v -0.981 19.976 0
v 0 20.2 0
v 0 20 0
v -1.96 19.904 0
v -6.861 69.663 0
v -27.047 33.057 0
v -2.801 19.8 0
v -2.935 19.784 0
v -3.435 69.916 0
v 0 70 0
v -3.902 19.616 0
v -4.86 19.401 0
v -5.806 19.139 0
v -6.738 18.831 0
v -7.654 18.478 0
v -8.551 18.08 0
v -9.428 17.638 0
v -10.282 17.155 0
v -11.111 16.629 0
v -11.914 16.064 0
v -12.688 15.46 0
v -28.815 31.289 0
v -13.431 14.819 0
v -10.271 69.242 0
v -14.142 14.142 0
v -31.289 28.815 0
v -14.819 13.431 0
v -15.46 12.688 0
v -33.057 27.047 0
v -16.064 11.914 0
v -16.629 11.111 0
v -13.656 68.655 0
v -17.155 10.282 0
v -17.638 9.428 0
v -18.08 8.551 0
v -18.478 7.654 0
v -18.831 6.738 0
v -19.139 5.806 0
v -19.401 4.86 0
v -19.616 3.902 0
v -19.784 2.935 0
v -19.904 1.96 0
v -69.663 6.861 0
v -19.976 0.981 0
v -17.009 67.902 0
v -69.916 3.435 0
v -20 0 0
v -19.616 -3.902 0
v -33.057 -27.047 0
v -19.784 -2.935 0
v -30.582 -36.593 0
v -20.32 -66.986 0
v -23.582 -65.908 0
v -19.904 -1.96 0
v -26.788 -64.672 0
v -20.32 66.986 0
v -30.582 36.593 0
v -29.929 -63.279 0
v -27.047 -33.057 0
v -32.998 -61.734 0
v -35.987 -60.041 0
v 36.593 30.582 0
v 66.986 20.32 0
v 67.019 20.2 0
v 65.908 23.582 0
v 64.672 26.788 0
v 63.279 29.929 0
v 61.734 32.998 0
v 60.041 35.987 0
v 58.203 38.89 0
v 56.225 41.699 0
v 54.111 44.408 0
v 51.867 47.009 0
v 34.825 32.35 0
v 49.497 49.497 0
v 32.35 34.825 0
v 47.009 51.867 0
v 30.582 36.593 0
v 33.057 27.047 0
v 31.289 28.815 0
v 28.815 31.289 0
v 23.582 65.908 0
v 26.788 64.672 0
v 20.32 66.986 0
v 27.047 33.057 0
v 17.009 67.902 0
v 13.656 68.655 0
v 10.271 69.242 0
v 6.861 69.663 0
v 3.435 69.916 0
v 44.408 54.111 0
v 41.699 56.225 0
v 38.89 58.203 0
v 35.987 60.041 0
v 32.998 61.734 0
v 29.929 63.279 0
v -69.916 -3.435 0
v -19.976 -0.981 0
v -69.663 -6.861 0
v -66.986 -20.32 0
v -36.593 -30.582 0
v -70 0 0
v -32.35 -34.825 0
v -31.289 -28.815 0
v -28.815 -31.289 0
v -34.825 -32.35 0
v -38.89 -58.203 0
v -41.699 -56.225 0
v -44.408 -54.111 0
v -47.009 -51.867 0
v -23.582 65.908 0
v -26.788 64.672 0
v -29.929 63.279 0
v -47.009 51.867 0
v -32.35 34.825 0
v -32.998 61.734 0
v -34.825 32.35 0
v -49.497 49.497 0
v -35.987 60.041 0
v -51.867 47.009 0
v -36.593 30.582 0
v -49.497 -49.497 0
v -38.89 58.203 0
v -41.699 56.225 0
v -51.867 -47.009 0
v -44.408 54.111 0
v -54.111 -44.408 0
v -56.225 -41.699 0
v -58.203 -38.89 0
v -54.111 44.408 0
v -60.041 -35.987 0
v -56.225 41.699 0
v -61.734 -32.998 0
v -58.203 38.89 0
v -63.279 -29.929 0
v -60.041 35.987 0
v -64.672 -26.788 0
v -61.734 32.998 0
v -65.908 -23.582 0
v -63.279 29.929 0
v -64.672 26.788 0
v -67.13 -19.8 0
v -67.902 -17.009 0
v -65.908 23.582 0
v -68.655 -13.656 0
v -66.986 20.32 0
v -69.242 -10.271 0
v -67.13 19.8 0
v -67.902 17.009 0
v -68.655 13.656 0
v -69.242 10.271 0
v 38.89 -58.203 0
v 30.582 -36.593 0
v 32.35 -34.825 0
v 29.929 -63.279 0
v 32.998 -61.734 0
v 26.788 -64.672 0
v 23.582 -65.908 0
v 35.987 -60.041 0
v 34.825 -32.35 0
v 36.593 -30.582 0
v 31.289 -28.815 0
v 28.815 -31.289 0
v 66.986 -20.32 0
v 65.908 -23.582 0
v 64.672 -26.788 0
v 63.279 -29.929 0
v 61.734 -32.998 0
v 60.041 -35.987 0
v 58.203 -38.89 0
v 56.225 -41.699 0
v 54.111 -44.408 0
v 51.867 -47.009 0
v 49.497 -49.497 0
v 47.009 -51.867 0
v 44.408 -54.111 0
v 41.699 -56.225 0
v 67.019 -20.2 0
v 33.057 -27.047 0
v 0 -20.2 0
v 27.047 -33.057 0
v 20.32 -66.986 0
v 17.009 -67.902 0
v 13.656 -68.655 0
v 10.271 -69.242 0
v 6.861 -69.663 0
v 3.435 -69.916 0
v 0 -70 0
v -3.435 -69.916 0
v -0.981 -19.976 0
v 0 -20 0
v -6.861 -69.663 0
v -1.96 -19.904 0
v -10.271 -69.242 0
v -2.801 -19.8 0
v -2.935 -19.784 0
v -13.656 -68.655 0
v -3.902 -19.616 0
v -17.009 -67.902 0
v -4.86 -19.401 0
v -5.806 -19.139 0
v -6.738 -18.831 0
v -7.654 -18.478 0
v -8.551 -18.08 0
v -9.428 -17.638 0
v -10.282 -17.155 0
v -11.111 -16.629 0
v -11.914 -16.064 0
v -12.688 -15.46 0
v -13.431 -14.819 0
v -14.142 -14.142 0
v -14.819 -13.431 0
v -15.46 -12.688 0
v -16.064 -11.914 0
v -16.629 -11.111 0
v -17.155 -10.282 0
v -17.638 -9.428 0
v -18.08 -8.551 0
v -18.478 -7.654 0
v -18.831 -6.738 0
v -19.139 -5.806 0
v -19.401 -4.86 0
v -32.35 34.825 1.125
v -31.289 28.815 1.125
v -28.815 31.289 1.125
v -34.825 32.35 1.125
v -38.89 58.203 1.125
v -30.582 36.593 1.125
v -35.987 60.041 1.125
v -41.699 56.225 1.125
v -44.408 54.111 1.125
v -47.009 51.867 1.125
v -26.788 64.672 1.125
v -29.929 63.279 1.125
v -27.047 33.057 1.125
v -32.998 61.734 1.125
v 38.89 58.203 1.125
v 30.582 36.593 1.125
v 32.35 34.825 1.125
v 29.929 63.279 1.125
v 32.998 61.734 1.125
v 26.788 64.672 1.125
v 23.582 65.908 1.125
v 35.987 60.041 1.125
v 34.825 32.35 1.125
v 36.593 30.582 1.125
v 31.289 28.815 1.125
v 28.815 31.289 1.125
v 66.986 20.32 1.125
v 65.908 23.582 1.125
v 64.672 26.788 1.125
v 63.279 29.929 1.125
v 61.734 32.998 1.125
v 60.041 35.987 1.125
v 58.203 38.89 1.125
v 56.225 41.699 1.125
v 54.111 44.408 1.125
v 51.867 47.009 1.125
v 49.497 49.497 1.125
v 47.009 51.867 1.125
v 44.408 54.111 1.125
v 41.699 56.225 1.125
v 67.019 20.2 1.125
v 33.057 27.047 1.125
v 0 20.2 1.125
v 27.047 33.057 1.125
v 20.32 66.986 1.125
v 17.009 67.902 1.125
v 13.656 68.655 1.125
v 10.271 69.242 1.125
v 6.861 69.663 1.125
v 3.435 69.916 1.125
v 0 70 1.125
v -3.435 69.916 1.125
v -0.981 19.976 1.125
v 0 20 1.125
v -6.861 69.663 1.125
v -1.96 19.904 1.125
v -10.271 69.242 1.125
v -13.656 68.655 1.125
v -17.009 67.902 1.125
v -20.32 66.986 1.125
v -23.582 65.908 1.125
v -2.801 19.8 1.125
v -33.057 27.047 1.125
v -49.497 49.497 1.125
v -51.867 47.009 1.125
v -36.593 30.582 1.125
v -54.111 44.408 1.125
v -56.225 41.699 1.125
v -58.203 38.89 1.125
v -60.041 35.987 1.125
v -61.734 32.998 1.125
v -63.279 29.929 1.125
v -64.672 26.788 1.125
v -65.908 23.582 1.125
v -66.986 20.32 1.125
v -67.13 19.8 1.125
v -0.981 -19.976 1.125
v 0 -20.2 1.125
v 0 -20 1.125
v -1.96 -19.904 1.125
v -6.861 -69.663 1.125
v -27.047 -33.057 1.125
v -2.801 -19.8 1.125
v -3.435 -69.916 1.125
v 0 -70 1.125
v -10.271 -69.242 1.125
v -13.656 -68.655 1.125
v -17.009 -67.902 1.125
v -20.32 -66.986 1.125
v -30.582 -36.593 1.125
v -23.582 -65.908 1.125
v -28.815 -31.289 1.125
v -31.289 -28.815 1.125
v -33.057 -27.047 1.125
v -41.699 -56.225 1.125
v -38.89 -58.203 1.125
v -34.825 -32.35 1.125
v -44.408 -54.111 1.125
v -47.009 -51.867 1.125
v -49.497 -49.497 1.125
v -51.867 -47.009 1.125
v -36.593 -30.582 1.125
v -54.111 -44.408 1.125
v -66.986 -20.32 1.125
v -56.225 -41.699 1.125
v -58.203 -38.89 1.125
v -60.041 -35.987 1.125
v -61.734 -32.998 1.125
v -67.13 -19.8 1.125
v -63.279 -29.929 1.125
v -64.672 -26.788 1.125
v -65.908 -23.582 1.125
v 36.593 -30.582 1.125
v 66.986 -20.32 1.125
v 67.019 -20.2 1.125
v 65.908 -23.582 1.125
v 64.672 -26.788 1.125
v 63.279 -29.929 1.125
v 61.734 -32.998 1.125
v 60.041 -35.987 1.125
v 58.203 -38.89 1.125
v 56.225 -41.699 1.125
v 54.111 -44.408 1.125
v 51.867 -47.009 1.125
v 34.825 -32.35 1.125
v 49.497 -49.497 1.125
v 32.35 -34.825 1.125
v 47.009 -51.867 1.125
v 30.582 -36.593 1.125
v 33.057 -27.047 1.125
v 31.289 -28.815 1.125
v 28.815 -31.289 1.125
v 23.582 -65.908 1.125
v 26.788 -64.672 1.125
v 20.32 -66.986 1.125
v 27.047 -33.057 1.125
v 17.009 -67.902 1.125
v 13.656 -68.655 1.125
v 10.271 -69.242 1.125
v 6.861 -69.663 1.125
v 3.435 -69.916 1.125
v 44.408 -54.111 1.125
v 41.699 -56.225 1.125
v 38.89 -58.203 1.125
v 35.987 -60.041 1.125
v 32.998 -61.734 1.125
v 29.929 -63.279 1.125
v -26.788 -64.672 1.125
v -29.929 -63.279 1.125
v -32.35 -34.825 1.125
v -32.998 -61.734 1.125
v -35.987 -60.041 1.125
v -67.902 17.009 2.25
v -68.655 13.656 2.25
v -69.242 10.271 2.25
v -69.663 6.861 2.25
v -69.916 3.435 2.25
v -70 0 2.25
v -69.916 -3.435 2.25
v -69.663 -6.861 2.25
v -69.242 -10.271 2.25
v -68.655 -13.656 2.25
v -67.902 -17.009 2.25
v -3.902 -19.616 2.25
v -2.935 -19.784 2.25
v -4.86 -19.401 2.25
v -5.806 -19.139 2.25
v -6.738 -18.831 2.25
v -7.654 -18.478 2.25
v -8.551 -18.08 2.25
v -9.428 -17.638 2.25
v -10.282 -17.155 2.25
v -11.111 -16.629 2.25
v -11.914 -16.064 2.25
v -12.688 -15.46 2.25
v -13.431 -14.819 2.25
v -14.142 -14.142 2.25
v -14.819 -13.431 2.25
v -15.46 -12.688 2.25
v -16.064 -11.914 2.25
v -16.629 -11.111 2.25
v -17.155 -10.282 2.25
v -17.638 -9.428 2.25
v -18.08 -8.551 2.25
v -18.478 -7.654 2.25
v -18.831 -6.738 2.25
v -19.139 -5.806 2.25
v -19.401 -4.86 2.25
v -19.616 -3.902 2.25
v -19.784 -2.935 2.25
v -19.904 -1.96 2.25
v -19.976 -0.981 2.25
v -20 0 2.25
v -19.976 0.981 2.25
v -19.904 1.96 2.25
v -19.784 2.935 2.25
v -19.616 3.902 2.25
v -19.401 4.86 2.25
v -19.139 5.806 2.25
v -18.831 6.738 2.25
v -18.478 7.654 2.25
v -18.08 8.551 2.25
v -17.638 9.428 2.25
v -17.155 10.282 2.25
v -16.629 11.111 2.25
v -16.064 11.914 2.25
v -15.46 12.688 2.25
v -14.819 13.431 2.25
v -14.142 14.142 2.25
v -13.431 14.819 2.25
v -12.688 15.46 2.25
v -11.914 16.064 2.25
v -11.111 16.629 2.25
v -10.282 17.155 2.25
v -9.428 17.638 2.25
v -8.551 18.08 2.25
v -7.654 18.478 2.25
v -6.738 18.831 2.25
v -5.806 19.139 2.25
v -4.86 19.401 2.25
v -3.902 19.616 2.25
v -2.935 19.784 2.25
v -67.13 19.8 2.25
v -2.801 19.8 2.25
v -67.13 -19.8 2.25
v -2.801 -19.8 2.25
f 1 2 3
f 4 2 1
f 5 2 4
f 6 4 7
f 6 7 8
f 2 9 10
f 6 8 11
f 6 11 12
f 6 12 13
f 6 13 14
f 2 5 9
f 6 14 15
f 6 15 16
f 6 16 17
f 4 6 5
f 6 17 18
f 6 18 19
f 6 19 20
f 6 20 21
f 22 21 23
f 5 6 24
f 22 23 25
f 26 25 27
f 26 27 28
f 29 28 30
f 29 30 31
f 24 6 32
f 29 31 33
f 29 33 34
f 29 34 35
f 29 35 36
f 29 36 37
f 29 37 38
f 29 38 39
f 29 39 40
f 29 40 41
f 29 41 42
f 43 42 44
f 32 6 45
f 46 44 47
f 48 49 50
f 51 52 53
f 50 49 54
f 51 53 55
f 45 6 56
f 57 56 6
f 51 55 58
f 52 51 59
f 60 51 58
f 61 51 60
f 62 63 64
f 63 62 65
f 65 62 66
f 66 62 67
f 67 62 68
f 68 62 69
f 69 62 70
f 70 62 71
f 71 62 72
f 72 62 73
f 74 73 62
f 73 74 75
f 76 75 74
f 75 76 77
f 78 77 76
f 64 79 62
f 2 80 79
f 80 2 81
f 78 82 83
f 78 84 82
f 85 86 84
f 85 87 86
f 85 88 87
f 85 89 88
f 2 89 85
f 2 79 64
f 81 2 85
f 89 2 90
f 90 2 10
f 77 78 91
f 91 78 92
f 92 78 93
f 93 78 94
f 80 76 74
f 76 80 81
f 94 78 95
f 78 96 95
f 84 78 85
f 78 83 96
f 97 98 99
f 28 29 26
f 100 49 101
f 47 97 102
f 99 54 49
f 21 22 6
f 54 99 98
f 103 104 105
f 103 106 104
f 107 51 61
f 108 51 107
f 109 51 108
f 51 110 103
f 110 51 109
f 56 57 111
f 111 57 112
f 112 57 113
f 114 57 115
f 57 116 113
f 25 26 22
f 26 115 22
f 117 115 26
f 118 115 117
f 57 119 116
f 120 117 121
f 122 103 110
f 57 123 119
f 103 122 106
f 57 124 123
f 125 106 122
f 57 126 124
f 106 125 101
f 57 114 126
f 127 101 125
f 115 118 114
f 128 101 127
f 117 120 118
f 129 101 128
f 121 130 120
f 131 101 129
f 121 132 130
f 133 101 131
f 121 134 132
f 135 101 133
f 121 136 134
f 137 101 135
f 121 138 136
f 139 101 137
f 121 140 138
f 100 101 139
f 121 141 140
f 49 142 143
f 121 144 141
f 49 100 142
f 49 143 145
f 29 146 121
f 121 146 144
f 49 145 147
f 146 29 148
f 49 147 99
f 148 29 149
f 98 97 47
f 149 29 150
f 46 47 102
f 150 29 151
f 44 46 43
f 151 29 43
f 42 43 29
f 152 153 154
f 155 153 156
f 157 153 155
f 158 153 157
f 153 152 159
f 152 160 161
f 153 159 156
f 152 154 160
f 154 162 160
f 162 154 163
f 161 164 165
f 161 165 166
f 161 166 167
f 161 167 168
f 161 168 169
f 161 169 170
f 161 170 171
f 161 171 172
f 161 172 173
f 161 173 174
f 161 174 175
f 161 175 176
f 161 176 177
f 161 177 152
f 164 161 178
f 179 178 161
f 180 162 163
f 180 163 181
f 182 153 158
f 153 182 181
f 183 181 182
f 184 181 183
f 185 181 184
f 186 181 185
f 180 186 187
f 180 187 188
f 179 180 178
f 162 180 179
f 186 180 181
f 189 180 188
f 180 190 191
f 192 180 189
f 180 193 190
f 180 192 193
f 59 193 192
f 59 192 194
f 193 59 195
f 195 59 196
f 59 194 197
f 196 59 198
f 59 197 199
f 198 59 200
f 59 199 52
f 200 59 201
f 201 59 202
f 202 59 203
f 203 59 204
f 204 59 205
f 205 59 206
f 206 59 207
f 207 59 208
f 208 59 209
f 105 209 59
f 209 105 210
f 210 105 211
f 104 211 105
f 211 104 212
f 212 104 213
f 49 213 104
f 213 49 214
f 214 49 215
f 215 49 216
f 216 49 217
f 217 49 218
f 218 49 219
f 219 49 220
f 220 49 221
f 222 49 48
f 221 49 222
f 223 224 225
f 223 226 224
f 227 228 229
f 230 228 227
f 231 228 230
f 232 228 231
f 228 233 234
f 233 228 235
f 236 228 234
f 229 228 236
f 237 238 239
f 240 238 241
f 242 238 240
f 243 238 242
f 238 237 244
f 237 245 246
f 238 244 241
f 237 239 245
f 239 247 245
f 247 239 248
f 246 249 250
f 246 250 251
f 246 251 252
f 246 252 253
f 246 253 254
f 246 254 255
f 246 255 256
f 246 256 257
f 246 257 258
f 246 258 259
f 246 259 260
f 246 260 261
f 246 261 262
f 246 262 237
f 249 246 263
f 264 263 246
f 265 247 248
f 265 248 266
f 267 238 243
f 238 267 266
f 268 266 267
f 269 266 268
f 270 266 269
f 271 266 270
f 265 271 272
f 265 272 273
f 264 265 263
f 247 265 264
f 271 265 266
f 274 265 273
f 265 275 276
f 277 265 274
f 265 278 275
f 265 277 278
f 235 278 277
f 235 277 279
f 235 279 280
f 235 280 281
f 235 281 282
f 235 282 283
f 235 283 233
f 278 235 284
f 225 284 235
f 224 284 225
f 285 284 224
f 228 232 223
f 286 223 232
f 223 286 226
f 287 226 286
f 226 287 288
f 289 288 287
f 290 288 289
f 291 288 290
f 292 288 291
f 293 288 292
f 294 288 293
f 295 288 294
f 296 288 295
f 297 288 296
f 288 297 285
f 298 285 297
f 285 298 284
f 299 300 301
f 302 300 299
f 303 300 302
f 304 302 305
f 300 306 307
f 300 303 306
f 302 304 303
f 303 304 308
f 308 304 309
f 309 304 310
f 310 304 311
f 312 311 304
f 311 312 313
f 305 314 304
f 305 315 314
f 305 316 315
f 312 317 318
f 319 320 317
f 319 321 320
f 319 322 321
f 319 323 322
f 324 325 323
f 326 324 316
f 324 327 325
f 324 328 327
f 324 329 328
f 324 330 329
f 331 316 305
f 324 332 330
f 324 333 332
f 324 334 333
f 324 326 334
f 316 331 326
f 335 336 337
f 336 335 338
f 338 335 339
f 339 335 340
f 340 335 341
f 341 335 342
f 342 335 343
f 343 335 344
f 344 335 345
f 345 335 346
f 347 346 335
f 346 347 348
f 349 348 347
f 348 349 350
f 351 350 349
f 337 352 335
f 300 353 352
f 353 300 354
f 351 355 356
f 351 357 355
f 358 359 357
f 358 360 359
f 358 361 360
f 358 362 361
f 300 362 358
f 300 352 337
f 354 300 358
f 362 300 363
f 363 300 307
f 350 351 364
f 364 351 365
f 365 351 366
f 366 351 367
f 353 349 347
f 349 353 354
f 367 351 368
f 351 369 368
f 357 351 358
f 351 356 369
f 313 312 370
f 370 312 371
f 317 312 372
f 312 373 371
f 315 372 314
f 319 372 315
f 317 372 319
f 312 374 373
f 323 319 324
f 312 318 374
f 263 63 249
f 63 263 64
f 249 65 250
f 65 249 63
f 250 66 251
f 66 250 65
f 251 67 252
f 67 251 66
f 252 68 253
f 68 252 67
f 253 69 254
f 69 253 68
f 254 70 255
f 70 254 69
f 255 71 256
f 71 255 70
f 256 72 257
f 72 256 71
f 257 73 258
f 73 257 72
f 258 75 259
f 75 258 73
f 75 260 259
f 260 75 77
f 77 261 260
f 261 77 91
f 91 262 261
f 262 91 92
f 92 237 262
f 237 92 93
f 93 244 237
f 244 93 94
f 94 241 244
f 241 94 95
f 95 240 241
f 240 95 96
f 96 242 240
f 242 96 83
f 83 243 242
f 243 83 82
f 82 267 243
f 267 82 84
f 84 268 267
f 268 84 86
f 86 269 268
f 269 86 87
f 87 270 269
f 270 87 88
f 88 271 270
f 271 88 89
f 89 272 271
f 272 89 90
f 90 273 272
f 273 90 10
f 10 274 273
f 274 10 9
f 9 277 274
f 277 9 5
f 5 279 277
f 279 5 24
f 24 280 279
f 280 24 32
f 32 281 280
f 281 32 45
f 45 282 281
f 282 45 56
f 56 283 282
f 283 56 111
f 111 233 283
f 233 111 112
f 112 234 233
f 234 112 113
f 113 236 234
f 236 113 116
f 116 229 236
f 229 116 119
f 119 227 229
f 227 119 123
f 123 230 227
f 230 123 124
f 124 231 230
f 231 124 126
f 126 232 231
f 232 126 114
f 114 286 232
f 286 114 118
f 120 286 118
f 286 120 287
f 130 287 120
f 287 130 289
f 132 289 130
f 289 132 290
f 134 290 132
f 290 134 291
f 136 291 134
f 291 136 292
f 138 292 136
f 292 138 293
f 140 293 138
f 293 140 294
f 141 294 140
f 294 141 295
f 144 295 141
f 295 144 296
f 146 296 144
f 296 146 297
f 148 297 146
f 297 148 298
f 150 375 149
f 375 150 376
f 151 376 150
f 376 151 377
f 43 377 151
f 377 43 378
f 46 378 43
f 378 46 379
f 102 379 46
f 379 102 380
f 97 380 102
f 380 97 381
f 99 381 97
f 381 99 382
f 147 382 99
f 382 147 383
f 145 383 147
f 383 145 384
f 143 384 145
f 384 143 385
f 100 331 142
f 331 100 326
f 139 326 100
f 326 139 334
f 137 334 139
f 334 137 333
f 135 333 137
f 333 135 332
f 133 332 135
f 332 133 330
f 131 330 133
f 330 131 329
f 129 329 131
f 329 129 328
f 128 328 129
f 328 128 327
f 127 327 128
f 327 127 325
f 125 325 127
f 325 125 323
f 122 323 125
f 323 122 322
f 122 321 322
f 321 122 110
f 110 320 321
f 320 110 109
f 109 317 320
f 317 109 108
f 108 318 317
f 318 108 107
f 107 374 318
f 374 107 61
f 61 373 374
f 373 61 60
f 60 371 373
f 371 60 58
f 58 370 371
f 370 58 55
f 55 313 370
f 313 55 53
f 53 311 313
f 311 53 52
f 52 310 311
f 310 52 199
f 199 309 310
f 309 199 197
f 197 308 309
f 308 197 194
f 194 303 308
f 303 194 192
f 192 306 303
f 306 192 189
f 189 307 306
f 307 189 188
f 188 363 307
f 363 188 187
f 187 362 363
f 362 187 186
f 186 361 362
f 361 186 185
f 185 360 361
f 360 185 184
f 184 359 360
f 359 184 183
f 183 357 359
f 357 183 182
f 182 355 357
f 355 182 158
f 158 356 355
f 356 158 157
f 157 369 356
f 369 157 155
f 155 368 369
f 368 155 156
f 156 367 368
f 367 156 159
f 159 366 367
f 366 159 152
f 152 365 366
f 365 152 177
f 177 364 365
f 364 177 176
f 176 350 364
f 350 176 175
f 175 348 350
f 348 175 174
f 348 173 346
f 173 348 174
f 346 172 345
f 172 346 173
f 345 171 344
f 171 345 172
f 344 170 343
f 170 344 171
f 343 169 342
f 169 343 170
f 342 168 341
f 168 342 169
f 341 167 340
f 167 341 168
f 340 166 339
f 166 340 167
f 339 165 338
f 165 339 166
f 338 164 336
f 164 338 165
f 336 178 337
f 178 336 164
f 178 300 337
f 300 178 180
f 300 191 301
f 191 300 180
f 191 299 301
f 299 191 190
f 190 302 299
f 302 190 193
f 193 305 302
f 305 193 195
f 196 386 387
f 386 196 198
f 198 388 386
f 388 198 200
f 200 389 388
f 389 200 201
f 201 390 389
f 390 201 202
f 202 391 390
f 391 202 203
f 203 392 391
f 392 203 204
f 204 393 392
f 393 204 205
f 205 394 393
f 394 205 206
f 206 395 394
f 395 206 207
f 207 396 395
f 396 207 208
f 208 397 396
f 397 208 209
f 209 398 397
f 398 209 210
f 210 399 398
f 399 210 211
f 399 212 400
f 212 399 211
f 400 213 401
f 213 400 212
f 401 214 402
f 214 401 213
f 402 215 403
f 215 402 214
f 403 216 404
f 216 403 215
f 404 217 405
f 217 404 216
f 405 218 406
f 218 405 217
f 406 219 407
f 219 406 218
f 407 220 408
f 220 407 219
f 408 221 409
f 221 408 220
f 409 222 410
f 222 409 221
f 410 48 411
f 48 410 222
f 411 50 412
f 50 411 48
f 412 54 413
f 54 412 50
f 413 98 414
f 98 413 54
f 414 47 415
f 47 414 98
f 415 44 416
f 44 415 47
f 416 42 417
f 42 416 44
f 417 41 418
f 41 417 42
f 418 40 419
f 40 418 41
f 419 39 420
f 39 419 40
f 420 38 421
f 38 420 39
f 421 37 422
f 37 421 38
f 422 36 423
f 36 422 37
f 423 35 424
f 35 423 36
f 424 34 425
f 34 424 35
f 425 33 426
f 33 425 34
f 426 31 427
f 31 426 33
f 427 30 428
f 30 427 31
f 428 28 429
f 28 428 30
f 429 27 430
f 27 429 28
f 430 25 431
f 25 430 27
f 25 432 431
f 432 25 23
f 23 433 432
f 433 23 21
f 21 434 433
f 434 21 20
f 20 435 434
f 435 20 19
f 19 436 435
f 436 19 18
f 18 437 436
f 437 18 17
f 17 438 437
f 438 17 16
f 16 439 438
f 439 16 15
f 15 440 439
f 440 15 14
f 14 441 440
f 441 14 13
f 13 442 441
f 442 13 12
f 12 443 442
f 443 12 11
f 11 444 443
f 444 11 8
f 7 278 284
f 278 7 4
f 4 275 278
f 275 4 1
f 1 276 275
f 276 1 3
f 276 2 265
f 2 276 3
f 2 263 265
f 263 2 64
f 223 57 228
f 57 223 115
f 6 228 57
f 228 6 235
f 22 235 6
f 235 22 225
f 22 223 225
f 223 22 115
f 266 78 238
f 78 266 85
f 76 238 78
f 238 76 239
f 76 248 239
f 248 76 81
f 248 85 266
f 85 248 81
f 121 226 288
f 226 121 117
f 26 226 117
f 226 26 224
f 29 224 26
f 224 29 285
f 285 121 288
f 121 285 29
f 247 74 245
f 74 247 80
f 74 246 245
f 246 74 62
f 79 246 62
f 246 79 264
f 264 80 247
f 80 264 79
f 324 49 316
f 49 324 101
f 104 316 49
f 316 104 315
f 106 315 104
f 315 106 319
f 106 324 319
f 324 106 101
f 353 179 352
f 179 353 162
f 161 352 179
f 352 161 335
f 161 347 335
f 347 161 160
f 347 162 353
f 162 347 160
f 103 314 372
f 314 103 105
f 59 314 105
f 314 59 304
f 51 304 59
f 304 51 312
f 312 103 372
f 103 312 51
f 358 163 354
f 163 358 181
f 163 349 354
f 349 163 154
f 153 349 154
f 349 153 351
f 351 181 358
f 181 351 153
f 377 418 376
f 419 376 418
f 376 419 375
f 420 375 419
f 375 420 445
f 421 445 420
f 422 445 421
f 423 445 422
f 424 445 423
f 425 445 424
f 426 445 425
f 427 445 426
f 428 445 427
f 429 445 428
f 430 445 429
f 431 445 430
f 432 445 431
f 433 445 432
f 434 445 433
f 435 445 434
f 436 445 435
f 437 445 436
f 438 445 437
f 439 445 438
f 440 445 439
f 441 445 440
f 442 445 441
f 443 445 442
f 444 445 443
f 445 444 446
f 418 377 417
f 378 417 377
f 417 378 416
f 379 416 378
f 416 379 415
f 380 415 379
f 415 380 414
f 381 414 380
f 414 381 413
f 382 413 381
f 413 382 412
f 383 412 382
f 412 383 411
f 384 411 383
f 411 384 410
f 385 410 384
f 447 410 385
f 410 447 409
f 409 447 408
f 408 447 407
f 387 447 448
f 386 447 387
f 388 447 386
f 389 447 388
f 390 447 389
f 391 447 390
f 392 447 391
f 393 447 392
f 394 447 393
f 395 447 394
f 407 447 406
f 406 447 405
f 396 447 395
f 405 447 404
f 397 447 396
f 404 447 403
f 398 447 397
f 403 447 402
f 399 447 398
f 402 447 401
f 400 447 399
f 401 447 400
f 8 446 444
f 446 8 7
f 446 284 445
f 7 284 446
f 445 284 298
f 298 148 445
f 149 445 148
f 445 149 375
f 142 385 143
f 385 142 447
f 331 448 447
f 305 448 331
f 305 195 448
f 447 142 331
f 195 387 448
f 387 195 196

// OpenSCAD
innerDiameter = 40;
outerDiameter = 140;
totalThickness = 2.25;
mountingHoles = 4;
relativeHoleLocation = 0.5;
tolerance = 0.4;

module dummy() {}

$fn = 128;

module mountingHole() {
    translate([0,-3]) square([5,2.5],center=true);
    translate([0,3]) square([5,2.5],center=true);
}

module base() {
    rotate(360/(2*mountingHoles))
    difference() {
        circle(d=outerDiameter);
        circle(d=innerDiameter);
        for (i=[0:1:mountingHoles-1]) rotate(360/mountingHoles*i) translate([(outerDiameter*(relativeHoleLocation)+innerDiameter*(1-relativeHoleLocation))/2,0]) mountingHole();
    }
}

module extra(tolerance) {
    intersection() {
        translate([outerDiameter/2,0]) square([outerDiameter,innerDiameter+2*tolerance], center=true);
        base();
    }
}

linear_extrude(height=totalThickness/2) difference() {
        base();
        extra(tolerance/2);
    }
linear_extrude(height=totalThickness) intersection() {
        base();
        rotate(180) extra(-tolerance/2);
    }
